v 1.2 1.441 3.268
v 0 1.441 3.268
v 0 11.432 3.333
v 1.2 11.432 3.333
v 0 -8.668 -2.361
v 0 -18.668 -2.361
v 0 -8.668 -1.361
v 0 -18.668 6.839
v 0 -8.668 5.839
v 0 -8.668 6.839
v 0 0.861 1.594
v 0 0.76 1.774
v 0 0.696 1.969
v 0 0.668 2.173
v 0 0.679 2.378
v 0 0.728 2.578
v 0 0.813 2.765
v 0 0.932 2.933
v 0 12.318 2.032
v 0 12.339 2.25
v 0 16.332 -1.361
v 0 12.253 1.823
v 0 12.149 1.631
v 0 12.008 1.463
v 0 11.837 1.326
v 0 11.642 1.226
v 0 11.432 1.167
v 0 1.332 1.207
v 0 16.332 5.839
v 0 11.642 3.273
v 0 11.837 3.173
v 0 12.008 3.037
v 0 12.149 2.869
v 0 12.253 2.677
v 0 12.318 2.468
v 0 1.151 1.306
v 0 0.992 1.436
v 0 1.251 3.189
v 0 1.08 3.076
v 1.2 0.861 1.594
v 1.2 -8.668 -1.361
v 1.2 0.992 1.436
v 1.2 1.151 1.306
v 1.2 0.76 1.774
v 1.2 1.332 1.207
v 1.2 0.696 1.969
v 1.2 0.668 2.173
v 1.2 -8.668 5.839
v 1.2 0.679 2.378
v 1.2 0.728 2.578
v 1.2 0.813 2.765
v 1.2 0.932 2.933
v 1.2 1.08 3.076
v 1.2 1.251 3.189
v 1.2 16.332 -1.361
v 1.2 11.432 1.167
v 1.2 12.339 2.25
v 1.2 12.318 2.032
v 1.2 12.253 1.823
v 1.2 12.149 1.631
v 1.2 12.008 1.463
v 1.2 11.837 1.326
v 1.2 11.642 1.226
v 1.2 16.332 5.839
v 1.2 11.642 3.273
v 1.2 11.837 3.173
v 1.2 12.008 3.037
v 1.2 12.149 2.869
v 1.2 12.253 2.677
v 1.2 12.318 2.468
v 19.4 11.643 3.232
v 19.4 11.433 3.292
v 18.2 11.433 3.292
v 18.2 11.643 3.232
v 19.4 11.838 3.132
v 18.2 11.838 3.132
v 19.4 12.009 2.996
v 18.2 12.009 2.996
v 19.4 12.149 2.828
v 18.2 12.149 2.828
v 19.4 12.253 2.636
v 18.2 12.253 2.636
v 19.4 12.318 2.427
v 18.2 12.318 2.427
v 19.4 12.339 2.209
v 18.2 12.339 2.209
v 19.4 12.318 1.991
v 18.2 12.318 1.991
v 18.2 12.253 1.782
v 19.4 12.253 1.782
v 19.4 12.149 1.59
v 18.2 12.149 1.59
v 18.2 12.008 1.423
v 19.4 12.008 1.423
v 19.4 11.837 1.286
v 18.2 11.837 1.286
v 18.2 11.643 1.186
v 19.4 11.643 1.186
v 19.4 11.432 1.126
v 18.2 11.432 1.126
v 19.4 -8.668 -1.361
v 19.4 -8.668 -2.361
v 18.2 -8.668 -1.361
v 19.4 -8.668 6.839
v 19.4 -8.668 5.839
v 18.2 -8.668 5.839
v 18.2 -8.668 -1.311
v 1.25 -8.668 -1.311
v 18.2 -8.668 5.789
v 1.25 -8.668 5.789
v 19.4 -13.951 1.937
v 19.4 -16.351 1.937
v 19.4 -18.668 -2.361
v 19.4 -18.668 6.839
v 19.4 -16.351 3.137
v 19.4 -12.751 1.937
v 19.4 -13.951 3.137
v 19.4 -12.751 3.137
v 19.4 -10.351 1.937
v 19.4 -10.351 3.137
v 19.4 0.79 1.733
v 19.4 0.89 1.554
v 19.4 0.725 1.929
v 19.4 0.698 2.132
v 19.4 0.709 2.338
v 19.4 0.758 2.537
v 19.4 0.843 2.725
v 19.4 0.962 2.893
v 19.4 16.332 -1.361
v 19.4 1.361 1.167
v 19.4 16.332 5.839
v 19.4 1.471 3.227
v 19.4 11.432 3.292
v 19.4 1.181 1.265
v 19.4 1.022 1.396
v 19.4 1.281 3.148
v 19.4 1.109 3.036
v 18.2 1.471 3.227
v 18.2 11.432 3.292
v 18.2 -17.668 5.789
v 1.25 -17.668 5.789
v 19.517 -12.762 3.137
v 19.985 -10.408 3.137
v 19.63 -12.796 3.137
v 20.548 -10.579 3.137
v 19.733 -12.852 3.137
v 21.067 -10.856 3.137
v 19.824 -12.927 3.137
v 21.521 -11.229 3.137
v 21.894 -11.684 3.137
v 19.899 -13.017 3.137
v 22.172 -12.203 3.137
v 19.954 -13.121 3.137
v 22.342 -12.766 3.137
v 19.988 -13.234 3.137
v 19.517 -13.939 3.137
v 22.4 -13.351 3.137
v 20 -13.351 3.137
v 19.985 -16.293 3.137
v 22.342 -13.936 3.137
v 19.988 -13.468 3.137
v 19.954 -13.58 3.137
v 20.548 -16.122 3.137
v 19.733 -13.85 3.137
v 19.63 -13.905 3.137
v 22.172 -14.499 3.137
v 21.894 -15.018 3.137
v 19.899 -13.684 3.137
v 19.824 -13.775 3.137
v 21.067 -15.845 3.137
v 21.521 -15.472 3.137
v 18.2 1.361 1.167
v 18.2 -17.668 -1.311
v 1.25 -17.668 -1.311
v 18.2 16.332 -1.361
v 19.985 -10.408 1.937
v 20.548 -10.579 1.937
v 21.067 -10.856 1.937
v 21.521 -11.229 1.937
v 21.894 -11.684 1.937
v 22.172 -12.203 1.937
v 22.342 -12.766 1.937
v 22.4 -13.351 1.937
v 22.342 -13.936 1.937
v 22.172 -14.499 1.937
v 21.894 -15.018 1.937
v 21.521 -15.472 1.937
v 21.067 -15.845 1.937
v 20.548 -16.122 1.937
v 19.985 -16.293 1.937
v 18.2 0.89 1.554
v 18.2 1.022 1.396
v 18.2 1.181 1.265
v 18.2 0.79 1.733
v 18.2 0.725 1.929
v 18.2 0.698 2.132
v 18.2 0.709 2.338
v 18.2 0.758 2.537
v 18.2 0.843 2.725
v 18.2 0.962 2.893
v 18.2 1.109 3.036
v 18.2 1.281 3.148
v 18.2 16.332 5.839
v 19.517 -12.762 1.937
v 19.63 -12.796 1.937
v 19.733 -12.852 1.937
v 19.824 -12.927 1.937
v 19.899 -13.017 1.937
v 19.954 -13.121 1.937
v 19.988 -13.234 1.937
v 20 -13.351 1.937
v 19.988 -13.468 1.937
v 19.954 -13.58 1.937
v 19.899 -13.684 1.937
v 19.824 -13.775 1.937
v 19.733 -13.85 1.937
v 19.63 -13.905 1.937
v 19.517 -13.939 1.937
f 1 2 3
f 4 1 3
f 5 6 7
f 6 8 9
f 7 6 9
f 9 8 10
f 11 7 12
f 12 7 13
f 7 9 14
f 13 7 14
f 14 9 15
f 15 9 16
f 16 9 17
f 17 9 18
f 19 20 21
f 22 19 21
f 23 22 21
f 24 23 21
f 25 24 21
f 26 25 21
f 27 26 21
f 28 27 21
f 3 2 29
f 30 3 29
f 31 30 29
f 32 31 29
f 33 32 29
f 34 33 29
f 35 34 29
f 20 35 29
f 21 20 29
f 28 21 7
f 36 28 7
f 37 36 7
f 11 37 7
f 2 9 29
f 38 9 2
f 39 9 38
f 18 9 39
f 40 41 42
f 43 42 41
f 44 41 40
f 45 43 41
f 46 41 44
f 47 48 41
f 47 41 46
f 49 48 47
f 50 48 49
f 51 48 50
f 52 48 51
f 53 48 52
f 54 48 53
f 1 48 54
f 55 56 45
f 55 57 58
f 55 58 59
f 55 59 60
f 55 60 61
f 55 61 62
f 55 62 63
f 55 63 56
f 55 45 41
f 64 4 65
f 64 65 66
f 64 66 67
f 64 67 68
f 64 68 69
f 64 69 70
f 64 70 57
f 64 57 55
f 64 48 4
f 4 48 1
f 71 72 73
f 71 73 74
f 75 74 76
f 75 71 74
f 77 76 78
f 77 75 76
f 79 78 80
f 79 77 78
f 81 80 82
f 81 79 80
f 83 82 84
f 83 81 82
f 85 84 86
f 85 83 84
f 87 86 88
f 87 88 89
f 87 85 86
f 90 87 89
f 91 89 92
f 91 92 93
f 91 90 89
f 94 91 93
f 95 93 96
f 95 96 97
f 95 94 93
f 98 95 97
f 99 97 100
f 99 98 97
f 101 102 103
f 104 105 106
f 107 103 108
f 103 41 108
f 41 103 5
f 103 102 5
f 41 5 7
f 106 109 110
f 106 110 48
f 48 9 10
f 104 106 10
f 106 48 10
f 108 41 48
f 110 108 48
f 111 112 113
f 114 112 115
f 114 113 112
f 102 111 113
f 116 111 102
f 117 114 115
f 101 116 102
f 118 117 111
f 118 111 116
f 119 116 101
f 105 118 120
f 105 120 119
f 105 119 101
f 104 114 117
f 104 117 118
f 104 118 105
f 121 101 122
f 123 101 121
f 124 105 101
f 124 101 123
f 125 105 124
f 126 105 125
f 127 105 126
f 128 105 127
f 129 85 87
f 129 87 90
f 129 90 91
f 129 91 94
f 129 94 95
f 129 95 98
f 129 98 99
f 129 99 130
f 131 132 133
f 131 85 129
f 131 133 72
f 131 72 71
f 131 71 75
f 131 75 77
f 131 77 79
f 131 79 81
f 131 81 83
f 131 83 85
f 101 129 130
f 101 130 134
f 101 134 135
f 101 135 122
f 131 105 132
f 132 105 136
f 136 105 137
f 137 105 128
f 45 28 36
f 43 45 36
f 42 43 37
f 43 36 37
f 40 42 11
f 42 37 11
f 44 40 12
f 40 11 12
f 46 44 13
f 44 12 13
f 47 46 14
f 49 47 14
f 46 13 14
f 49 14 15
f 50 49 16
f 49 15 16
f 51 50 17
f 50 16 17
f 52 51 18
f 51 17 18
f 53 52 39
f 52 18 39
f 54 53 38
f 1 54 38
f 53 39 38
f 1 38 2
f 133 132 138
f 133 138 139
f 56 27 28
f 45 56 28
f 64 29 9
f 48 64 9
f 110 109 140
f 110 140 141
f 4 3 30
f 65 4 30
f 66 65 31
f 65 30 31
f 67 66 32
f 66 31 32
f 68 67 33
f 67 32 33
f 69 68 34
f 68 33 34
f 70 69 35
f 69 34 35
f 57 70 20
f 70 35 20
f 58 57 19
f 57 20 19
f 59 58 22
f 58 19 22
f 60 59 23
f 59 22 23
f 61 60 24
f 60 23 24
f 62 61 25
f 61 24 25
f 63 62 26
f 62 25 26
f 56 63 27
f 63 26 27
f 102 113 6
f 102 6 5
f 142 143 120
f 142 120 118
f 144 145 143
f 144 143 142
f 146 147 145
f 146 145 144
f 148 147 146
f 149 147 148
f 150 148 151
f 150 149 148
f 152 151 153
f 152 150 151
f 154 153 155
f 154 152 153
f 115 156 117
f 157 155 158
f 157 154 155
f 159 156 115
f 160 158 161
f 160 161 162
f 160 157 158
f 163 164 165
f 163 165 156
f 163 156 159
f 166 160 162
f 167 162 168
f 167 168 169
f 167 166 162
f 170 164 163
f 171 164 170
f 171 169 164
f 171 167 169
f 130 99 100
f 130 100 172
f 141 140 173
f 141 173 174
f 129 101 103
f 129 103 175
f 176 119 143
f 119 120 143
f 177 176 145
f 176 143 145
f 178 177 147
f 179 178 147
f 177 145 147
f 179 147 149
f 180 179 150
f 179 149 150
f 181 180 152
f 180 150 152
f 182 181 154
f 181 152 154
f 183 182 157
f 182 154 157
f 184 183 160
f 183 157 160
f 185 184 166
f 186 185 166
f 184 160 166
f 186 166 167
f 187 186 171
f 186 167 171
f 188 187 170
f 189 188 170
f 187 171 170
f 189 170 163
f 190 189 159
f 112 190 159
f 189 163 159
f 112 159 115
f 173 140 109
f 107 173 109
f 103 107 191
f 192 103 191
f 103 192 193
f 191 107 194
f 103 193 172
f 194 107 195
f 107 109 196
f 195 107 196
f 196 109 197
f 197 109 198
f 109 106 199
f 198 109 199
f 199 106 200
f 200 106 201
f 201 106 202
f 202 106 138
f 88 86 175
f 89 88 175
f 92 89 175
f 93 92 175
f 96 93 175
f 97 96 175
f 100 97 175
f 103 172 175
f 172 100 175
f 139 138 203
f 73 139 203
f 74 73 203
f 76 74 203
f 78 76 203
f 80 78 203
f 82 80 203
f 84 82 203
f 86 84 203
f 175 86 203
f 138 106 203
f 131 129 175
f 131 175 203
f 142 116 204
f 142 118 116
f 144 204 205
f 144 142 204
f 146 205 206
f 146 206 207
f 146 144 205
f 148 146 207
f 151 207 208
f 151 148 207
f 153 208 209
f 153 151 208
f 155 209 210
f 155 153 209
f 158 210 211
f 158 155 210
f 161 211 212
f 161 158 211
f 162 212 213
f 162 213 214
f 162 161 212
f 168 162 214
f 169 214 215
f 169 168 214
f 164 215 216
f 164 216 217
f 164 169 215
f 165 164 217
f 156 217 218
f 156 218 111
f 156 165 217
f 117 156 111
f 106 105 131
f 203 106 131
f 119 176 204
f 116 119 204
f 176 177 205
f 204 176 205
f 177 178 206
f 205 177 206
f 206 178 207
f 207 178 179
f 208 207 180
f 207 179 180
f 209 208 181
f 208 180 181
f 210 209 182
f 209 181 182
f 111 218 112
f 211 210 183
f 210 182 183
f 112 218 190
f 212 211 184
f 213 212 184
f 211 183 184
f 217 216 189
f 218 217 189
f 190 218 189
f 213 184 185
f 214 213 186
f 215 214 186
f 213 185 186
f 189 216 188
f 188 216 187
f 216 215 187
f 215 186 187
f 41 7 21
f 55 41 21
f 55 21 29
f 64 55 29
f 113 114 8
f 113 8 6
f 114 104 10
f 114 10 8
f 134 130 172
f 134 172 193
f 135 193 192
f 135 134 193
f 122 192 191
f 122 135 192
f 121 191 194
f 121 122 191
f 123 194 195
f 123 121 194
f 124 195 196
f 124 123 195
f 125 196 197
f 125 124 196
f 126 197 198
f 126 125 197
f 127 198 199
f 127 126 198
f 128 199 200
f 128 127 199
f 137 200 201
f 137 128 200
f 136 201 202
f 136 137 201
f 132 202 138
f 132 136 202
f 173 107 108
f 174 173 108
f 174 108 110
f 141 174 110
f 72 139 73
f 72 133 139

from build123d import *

# Parameters (mm, degrees)
F1_DEPTH = 19.4
F2_DEPTH = 1.2
F3_W     = 25
F3_H     = 7.2
F4_DEPTH = 1.2
F5_W     = 16.95
F5_H     = 7.1
F6_DEPTH = 9
F7_W     = 2.4
F7_H     = 1.2
F8_ANGLE = 180


with BuildPart() as f1:
    # F0 (on Right) → F1 (new body)
    with BuildSketch(Plane.YZ):
        Polygon((-8.6684125125, 6.8394026556), (-18.6684125125, 6.8394026556), (-18.6684125125, -2.3605973444), (-8.6684125125, -2.3605973444), (-8.6684125125, -1.3605973444), (-8.6684125125, 2.2394026556), (-8.6684125125, 5.8394026556), align=None)
    extrude(amount=F1_DEPTH)

    # F0 (on Right) → F2 (join)
    with BuildSketch(Plane.YZ):
        Polygon((-8.6684125125, 6.8394026556), (-18.6684125125, 6.8394026556), (-18.6684125125, -2.3605973444), (-8.6684125125, -2.3605973444), (-8.6684125125, -1.3605973444), (-8.6684125125, 2.2394026556), (-8.6684125125, 5.8394026556), align=None)
        Polygon((16.3315874875, 5.8394026556), (-8.6684125125, 5.8394026556), (-8.6684125125, 2.2394026556), (-8.6684125125, -1.3605973444), (16.3315874875, -1.3605973444), align=None)
        with BuildLine():
            ThreePointArc((1.3315874875, 1.2072022274), (0.6686982275, 2.2757759463), (1.4412960947, 3.267927396))
            Line((1.4412960947, 3.267927396), (11.4315874875, 3.3328592428))
            ThreePointArc((11.4315874875, 3.3328592428), (12.3394869948, 2.2497630325), (11.4315874875, 1.1666668222))
            Line((11.4315874875, 1.1666668222), (1.3315874875, 1.2072022274))
        make_face(mode=Mode.SUBTRACT)
    extrude(amount=F2_DEPTH)

    # F3 (on face) → F4 (join)
    with BuildSketch(Plane.YZ.offset(19.4)):
        with Locations((3.8315874875, 2.2394026556)):
            Rectangle(F3_W, F3_H)
        with BuildLine():
            ThreePointArc((1.3613110944, 1.1667440413), (0.6984218344, 2.2353177601), (1.4710197016, 3.2274692099))
            Line((1.4710197016, 3.2274692099), (11.4315874875, 3.292145016))
            Line((11.4315874875, 3.292145016), (11.4315874875, 3.2924010566))
            ThreePointArc((11.4315874875, 3.2924010566), (11.4322813424, 3.2922777636), (11.4329751181, 3.2921540261))
            ThreePointArc((11.4329751181, 3.2921540261), (12.3394869633, 2.2090418078), (11.4324572213, 1.1263632544))
            ThreePointArc((11.4324572213, 1.1263632544), (11.4320223699, 1.1262858579), (11.4315874875, 1.1262086361))
            Line((11.4315874875, 1.1262086361), (11.4315874875, 1.1263667416))
            Line((11.4315874875, 1.1263667416), (1.3613110944, 1.1667440413))
        make_face(mode=Mode.SUBTRACT)
    extrude(amount=-F4_DEPTH)

    # F5 (on face) → F6 (cut)
    with BuildSketch(Plane(origin=(0, -8.6684125125, 0), x_dir=(-1, 0, 0), z_dir=(0, 1, 0))):
        with Locations((-9.725, 2.2394026556)):
            Rectangle(F5_W, F5_H)
    extrude(amount=-F6_DEPTH, mode=Mode.SUBTRACT)

    # F7 (on face) → F8 (revolve)
    with BuildSketch(Plane.YZ.offset(19.4)):
        with Locations((-11.550808993, 2.5371138187)):
            Rectangle(F7_W, F7_H)
    revolve(axis=Axis((19.4, -13.350808993, 2.5371138187), (0, 0, -1)), revolution_arc=F8_ANGLE)


solid = f1.part
